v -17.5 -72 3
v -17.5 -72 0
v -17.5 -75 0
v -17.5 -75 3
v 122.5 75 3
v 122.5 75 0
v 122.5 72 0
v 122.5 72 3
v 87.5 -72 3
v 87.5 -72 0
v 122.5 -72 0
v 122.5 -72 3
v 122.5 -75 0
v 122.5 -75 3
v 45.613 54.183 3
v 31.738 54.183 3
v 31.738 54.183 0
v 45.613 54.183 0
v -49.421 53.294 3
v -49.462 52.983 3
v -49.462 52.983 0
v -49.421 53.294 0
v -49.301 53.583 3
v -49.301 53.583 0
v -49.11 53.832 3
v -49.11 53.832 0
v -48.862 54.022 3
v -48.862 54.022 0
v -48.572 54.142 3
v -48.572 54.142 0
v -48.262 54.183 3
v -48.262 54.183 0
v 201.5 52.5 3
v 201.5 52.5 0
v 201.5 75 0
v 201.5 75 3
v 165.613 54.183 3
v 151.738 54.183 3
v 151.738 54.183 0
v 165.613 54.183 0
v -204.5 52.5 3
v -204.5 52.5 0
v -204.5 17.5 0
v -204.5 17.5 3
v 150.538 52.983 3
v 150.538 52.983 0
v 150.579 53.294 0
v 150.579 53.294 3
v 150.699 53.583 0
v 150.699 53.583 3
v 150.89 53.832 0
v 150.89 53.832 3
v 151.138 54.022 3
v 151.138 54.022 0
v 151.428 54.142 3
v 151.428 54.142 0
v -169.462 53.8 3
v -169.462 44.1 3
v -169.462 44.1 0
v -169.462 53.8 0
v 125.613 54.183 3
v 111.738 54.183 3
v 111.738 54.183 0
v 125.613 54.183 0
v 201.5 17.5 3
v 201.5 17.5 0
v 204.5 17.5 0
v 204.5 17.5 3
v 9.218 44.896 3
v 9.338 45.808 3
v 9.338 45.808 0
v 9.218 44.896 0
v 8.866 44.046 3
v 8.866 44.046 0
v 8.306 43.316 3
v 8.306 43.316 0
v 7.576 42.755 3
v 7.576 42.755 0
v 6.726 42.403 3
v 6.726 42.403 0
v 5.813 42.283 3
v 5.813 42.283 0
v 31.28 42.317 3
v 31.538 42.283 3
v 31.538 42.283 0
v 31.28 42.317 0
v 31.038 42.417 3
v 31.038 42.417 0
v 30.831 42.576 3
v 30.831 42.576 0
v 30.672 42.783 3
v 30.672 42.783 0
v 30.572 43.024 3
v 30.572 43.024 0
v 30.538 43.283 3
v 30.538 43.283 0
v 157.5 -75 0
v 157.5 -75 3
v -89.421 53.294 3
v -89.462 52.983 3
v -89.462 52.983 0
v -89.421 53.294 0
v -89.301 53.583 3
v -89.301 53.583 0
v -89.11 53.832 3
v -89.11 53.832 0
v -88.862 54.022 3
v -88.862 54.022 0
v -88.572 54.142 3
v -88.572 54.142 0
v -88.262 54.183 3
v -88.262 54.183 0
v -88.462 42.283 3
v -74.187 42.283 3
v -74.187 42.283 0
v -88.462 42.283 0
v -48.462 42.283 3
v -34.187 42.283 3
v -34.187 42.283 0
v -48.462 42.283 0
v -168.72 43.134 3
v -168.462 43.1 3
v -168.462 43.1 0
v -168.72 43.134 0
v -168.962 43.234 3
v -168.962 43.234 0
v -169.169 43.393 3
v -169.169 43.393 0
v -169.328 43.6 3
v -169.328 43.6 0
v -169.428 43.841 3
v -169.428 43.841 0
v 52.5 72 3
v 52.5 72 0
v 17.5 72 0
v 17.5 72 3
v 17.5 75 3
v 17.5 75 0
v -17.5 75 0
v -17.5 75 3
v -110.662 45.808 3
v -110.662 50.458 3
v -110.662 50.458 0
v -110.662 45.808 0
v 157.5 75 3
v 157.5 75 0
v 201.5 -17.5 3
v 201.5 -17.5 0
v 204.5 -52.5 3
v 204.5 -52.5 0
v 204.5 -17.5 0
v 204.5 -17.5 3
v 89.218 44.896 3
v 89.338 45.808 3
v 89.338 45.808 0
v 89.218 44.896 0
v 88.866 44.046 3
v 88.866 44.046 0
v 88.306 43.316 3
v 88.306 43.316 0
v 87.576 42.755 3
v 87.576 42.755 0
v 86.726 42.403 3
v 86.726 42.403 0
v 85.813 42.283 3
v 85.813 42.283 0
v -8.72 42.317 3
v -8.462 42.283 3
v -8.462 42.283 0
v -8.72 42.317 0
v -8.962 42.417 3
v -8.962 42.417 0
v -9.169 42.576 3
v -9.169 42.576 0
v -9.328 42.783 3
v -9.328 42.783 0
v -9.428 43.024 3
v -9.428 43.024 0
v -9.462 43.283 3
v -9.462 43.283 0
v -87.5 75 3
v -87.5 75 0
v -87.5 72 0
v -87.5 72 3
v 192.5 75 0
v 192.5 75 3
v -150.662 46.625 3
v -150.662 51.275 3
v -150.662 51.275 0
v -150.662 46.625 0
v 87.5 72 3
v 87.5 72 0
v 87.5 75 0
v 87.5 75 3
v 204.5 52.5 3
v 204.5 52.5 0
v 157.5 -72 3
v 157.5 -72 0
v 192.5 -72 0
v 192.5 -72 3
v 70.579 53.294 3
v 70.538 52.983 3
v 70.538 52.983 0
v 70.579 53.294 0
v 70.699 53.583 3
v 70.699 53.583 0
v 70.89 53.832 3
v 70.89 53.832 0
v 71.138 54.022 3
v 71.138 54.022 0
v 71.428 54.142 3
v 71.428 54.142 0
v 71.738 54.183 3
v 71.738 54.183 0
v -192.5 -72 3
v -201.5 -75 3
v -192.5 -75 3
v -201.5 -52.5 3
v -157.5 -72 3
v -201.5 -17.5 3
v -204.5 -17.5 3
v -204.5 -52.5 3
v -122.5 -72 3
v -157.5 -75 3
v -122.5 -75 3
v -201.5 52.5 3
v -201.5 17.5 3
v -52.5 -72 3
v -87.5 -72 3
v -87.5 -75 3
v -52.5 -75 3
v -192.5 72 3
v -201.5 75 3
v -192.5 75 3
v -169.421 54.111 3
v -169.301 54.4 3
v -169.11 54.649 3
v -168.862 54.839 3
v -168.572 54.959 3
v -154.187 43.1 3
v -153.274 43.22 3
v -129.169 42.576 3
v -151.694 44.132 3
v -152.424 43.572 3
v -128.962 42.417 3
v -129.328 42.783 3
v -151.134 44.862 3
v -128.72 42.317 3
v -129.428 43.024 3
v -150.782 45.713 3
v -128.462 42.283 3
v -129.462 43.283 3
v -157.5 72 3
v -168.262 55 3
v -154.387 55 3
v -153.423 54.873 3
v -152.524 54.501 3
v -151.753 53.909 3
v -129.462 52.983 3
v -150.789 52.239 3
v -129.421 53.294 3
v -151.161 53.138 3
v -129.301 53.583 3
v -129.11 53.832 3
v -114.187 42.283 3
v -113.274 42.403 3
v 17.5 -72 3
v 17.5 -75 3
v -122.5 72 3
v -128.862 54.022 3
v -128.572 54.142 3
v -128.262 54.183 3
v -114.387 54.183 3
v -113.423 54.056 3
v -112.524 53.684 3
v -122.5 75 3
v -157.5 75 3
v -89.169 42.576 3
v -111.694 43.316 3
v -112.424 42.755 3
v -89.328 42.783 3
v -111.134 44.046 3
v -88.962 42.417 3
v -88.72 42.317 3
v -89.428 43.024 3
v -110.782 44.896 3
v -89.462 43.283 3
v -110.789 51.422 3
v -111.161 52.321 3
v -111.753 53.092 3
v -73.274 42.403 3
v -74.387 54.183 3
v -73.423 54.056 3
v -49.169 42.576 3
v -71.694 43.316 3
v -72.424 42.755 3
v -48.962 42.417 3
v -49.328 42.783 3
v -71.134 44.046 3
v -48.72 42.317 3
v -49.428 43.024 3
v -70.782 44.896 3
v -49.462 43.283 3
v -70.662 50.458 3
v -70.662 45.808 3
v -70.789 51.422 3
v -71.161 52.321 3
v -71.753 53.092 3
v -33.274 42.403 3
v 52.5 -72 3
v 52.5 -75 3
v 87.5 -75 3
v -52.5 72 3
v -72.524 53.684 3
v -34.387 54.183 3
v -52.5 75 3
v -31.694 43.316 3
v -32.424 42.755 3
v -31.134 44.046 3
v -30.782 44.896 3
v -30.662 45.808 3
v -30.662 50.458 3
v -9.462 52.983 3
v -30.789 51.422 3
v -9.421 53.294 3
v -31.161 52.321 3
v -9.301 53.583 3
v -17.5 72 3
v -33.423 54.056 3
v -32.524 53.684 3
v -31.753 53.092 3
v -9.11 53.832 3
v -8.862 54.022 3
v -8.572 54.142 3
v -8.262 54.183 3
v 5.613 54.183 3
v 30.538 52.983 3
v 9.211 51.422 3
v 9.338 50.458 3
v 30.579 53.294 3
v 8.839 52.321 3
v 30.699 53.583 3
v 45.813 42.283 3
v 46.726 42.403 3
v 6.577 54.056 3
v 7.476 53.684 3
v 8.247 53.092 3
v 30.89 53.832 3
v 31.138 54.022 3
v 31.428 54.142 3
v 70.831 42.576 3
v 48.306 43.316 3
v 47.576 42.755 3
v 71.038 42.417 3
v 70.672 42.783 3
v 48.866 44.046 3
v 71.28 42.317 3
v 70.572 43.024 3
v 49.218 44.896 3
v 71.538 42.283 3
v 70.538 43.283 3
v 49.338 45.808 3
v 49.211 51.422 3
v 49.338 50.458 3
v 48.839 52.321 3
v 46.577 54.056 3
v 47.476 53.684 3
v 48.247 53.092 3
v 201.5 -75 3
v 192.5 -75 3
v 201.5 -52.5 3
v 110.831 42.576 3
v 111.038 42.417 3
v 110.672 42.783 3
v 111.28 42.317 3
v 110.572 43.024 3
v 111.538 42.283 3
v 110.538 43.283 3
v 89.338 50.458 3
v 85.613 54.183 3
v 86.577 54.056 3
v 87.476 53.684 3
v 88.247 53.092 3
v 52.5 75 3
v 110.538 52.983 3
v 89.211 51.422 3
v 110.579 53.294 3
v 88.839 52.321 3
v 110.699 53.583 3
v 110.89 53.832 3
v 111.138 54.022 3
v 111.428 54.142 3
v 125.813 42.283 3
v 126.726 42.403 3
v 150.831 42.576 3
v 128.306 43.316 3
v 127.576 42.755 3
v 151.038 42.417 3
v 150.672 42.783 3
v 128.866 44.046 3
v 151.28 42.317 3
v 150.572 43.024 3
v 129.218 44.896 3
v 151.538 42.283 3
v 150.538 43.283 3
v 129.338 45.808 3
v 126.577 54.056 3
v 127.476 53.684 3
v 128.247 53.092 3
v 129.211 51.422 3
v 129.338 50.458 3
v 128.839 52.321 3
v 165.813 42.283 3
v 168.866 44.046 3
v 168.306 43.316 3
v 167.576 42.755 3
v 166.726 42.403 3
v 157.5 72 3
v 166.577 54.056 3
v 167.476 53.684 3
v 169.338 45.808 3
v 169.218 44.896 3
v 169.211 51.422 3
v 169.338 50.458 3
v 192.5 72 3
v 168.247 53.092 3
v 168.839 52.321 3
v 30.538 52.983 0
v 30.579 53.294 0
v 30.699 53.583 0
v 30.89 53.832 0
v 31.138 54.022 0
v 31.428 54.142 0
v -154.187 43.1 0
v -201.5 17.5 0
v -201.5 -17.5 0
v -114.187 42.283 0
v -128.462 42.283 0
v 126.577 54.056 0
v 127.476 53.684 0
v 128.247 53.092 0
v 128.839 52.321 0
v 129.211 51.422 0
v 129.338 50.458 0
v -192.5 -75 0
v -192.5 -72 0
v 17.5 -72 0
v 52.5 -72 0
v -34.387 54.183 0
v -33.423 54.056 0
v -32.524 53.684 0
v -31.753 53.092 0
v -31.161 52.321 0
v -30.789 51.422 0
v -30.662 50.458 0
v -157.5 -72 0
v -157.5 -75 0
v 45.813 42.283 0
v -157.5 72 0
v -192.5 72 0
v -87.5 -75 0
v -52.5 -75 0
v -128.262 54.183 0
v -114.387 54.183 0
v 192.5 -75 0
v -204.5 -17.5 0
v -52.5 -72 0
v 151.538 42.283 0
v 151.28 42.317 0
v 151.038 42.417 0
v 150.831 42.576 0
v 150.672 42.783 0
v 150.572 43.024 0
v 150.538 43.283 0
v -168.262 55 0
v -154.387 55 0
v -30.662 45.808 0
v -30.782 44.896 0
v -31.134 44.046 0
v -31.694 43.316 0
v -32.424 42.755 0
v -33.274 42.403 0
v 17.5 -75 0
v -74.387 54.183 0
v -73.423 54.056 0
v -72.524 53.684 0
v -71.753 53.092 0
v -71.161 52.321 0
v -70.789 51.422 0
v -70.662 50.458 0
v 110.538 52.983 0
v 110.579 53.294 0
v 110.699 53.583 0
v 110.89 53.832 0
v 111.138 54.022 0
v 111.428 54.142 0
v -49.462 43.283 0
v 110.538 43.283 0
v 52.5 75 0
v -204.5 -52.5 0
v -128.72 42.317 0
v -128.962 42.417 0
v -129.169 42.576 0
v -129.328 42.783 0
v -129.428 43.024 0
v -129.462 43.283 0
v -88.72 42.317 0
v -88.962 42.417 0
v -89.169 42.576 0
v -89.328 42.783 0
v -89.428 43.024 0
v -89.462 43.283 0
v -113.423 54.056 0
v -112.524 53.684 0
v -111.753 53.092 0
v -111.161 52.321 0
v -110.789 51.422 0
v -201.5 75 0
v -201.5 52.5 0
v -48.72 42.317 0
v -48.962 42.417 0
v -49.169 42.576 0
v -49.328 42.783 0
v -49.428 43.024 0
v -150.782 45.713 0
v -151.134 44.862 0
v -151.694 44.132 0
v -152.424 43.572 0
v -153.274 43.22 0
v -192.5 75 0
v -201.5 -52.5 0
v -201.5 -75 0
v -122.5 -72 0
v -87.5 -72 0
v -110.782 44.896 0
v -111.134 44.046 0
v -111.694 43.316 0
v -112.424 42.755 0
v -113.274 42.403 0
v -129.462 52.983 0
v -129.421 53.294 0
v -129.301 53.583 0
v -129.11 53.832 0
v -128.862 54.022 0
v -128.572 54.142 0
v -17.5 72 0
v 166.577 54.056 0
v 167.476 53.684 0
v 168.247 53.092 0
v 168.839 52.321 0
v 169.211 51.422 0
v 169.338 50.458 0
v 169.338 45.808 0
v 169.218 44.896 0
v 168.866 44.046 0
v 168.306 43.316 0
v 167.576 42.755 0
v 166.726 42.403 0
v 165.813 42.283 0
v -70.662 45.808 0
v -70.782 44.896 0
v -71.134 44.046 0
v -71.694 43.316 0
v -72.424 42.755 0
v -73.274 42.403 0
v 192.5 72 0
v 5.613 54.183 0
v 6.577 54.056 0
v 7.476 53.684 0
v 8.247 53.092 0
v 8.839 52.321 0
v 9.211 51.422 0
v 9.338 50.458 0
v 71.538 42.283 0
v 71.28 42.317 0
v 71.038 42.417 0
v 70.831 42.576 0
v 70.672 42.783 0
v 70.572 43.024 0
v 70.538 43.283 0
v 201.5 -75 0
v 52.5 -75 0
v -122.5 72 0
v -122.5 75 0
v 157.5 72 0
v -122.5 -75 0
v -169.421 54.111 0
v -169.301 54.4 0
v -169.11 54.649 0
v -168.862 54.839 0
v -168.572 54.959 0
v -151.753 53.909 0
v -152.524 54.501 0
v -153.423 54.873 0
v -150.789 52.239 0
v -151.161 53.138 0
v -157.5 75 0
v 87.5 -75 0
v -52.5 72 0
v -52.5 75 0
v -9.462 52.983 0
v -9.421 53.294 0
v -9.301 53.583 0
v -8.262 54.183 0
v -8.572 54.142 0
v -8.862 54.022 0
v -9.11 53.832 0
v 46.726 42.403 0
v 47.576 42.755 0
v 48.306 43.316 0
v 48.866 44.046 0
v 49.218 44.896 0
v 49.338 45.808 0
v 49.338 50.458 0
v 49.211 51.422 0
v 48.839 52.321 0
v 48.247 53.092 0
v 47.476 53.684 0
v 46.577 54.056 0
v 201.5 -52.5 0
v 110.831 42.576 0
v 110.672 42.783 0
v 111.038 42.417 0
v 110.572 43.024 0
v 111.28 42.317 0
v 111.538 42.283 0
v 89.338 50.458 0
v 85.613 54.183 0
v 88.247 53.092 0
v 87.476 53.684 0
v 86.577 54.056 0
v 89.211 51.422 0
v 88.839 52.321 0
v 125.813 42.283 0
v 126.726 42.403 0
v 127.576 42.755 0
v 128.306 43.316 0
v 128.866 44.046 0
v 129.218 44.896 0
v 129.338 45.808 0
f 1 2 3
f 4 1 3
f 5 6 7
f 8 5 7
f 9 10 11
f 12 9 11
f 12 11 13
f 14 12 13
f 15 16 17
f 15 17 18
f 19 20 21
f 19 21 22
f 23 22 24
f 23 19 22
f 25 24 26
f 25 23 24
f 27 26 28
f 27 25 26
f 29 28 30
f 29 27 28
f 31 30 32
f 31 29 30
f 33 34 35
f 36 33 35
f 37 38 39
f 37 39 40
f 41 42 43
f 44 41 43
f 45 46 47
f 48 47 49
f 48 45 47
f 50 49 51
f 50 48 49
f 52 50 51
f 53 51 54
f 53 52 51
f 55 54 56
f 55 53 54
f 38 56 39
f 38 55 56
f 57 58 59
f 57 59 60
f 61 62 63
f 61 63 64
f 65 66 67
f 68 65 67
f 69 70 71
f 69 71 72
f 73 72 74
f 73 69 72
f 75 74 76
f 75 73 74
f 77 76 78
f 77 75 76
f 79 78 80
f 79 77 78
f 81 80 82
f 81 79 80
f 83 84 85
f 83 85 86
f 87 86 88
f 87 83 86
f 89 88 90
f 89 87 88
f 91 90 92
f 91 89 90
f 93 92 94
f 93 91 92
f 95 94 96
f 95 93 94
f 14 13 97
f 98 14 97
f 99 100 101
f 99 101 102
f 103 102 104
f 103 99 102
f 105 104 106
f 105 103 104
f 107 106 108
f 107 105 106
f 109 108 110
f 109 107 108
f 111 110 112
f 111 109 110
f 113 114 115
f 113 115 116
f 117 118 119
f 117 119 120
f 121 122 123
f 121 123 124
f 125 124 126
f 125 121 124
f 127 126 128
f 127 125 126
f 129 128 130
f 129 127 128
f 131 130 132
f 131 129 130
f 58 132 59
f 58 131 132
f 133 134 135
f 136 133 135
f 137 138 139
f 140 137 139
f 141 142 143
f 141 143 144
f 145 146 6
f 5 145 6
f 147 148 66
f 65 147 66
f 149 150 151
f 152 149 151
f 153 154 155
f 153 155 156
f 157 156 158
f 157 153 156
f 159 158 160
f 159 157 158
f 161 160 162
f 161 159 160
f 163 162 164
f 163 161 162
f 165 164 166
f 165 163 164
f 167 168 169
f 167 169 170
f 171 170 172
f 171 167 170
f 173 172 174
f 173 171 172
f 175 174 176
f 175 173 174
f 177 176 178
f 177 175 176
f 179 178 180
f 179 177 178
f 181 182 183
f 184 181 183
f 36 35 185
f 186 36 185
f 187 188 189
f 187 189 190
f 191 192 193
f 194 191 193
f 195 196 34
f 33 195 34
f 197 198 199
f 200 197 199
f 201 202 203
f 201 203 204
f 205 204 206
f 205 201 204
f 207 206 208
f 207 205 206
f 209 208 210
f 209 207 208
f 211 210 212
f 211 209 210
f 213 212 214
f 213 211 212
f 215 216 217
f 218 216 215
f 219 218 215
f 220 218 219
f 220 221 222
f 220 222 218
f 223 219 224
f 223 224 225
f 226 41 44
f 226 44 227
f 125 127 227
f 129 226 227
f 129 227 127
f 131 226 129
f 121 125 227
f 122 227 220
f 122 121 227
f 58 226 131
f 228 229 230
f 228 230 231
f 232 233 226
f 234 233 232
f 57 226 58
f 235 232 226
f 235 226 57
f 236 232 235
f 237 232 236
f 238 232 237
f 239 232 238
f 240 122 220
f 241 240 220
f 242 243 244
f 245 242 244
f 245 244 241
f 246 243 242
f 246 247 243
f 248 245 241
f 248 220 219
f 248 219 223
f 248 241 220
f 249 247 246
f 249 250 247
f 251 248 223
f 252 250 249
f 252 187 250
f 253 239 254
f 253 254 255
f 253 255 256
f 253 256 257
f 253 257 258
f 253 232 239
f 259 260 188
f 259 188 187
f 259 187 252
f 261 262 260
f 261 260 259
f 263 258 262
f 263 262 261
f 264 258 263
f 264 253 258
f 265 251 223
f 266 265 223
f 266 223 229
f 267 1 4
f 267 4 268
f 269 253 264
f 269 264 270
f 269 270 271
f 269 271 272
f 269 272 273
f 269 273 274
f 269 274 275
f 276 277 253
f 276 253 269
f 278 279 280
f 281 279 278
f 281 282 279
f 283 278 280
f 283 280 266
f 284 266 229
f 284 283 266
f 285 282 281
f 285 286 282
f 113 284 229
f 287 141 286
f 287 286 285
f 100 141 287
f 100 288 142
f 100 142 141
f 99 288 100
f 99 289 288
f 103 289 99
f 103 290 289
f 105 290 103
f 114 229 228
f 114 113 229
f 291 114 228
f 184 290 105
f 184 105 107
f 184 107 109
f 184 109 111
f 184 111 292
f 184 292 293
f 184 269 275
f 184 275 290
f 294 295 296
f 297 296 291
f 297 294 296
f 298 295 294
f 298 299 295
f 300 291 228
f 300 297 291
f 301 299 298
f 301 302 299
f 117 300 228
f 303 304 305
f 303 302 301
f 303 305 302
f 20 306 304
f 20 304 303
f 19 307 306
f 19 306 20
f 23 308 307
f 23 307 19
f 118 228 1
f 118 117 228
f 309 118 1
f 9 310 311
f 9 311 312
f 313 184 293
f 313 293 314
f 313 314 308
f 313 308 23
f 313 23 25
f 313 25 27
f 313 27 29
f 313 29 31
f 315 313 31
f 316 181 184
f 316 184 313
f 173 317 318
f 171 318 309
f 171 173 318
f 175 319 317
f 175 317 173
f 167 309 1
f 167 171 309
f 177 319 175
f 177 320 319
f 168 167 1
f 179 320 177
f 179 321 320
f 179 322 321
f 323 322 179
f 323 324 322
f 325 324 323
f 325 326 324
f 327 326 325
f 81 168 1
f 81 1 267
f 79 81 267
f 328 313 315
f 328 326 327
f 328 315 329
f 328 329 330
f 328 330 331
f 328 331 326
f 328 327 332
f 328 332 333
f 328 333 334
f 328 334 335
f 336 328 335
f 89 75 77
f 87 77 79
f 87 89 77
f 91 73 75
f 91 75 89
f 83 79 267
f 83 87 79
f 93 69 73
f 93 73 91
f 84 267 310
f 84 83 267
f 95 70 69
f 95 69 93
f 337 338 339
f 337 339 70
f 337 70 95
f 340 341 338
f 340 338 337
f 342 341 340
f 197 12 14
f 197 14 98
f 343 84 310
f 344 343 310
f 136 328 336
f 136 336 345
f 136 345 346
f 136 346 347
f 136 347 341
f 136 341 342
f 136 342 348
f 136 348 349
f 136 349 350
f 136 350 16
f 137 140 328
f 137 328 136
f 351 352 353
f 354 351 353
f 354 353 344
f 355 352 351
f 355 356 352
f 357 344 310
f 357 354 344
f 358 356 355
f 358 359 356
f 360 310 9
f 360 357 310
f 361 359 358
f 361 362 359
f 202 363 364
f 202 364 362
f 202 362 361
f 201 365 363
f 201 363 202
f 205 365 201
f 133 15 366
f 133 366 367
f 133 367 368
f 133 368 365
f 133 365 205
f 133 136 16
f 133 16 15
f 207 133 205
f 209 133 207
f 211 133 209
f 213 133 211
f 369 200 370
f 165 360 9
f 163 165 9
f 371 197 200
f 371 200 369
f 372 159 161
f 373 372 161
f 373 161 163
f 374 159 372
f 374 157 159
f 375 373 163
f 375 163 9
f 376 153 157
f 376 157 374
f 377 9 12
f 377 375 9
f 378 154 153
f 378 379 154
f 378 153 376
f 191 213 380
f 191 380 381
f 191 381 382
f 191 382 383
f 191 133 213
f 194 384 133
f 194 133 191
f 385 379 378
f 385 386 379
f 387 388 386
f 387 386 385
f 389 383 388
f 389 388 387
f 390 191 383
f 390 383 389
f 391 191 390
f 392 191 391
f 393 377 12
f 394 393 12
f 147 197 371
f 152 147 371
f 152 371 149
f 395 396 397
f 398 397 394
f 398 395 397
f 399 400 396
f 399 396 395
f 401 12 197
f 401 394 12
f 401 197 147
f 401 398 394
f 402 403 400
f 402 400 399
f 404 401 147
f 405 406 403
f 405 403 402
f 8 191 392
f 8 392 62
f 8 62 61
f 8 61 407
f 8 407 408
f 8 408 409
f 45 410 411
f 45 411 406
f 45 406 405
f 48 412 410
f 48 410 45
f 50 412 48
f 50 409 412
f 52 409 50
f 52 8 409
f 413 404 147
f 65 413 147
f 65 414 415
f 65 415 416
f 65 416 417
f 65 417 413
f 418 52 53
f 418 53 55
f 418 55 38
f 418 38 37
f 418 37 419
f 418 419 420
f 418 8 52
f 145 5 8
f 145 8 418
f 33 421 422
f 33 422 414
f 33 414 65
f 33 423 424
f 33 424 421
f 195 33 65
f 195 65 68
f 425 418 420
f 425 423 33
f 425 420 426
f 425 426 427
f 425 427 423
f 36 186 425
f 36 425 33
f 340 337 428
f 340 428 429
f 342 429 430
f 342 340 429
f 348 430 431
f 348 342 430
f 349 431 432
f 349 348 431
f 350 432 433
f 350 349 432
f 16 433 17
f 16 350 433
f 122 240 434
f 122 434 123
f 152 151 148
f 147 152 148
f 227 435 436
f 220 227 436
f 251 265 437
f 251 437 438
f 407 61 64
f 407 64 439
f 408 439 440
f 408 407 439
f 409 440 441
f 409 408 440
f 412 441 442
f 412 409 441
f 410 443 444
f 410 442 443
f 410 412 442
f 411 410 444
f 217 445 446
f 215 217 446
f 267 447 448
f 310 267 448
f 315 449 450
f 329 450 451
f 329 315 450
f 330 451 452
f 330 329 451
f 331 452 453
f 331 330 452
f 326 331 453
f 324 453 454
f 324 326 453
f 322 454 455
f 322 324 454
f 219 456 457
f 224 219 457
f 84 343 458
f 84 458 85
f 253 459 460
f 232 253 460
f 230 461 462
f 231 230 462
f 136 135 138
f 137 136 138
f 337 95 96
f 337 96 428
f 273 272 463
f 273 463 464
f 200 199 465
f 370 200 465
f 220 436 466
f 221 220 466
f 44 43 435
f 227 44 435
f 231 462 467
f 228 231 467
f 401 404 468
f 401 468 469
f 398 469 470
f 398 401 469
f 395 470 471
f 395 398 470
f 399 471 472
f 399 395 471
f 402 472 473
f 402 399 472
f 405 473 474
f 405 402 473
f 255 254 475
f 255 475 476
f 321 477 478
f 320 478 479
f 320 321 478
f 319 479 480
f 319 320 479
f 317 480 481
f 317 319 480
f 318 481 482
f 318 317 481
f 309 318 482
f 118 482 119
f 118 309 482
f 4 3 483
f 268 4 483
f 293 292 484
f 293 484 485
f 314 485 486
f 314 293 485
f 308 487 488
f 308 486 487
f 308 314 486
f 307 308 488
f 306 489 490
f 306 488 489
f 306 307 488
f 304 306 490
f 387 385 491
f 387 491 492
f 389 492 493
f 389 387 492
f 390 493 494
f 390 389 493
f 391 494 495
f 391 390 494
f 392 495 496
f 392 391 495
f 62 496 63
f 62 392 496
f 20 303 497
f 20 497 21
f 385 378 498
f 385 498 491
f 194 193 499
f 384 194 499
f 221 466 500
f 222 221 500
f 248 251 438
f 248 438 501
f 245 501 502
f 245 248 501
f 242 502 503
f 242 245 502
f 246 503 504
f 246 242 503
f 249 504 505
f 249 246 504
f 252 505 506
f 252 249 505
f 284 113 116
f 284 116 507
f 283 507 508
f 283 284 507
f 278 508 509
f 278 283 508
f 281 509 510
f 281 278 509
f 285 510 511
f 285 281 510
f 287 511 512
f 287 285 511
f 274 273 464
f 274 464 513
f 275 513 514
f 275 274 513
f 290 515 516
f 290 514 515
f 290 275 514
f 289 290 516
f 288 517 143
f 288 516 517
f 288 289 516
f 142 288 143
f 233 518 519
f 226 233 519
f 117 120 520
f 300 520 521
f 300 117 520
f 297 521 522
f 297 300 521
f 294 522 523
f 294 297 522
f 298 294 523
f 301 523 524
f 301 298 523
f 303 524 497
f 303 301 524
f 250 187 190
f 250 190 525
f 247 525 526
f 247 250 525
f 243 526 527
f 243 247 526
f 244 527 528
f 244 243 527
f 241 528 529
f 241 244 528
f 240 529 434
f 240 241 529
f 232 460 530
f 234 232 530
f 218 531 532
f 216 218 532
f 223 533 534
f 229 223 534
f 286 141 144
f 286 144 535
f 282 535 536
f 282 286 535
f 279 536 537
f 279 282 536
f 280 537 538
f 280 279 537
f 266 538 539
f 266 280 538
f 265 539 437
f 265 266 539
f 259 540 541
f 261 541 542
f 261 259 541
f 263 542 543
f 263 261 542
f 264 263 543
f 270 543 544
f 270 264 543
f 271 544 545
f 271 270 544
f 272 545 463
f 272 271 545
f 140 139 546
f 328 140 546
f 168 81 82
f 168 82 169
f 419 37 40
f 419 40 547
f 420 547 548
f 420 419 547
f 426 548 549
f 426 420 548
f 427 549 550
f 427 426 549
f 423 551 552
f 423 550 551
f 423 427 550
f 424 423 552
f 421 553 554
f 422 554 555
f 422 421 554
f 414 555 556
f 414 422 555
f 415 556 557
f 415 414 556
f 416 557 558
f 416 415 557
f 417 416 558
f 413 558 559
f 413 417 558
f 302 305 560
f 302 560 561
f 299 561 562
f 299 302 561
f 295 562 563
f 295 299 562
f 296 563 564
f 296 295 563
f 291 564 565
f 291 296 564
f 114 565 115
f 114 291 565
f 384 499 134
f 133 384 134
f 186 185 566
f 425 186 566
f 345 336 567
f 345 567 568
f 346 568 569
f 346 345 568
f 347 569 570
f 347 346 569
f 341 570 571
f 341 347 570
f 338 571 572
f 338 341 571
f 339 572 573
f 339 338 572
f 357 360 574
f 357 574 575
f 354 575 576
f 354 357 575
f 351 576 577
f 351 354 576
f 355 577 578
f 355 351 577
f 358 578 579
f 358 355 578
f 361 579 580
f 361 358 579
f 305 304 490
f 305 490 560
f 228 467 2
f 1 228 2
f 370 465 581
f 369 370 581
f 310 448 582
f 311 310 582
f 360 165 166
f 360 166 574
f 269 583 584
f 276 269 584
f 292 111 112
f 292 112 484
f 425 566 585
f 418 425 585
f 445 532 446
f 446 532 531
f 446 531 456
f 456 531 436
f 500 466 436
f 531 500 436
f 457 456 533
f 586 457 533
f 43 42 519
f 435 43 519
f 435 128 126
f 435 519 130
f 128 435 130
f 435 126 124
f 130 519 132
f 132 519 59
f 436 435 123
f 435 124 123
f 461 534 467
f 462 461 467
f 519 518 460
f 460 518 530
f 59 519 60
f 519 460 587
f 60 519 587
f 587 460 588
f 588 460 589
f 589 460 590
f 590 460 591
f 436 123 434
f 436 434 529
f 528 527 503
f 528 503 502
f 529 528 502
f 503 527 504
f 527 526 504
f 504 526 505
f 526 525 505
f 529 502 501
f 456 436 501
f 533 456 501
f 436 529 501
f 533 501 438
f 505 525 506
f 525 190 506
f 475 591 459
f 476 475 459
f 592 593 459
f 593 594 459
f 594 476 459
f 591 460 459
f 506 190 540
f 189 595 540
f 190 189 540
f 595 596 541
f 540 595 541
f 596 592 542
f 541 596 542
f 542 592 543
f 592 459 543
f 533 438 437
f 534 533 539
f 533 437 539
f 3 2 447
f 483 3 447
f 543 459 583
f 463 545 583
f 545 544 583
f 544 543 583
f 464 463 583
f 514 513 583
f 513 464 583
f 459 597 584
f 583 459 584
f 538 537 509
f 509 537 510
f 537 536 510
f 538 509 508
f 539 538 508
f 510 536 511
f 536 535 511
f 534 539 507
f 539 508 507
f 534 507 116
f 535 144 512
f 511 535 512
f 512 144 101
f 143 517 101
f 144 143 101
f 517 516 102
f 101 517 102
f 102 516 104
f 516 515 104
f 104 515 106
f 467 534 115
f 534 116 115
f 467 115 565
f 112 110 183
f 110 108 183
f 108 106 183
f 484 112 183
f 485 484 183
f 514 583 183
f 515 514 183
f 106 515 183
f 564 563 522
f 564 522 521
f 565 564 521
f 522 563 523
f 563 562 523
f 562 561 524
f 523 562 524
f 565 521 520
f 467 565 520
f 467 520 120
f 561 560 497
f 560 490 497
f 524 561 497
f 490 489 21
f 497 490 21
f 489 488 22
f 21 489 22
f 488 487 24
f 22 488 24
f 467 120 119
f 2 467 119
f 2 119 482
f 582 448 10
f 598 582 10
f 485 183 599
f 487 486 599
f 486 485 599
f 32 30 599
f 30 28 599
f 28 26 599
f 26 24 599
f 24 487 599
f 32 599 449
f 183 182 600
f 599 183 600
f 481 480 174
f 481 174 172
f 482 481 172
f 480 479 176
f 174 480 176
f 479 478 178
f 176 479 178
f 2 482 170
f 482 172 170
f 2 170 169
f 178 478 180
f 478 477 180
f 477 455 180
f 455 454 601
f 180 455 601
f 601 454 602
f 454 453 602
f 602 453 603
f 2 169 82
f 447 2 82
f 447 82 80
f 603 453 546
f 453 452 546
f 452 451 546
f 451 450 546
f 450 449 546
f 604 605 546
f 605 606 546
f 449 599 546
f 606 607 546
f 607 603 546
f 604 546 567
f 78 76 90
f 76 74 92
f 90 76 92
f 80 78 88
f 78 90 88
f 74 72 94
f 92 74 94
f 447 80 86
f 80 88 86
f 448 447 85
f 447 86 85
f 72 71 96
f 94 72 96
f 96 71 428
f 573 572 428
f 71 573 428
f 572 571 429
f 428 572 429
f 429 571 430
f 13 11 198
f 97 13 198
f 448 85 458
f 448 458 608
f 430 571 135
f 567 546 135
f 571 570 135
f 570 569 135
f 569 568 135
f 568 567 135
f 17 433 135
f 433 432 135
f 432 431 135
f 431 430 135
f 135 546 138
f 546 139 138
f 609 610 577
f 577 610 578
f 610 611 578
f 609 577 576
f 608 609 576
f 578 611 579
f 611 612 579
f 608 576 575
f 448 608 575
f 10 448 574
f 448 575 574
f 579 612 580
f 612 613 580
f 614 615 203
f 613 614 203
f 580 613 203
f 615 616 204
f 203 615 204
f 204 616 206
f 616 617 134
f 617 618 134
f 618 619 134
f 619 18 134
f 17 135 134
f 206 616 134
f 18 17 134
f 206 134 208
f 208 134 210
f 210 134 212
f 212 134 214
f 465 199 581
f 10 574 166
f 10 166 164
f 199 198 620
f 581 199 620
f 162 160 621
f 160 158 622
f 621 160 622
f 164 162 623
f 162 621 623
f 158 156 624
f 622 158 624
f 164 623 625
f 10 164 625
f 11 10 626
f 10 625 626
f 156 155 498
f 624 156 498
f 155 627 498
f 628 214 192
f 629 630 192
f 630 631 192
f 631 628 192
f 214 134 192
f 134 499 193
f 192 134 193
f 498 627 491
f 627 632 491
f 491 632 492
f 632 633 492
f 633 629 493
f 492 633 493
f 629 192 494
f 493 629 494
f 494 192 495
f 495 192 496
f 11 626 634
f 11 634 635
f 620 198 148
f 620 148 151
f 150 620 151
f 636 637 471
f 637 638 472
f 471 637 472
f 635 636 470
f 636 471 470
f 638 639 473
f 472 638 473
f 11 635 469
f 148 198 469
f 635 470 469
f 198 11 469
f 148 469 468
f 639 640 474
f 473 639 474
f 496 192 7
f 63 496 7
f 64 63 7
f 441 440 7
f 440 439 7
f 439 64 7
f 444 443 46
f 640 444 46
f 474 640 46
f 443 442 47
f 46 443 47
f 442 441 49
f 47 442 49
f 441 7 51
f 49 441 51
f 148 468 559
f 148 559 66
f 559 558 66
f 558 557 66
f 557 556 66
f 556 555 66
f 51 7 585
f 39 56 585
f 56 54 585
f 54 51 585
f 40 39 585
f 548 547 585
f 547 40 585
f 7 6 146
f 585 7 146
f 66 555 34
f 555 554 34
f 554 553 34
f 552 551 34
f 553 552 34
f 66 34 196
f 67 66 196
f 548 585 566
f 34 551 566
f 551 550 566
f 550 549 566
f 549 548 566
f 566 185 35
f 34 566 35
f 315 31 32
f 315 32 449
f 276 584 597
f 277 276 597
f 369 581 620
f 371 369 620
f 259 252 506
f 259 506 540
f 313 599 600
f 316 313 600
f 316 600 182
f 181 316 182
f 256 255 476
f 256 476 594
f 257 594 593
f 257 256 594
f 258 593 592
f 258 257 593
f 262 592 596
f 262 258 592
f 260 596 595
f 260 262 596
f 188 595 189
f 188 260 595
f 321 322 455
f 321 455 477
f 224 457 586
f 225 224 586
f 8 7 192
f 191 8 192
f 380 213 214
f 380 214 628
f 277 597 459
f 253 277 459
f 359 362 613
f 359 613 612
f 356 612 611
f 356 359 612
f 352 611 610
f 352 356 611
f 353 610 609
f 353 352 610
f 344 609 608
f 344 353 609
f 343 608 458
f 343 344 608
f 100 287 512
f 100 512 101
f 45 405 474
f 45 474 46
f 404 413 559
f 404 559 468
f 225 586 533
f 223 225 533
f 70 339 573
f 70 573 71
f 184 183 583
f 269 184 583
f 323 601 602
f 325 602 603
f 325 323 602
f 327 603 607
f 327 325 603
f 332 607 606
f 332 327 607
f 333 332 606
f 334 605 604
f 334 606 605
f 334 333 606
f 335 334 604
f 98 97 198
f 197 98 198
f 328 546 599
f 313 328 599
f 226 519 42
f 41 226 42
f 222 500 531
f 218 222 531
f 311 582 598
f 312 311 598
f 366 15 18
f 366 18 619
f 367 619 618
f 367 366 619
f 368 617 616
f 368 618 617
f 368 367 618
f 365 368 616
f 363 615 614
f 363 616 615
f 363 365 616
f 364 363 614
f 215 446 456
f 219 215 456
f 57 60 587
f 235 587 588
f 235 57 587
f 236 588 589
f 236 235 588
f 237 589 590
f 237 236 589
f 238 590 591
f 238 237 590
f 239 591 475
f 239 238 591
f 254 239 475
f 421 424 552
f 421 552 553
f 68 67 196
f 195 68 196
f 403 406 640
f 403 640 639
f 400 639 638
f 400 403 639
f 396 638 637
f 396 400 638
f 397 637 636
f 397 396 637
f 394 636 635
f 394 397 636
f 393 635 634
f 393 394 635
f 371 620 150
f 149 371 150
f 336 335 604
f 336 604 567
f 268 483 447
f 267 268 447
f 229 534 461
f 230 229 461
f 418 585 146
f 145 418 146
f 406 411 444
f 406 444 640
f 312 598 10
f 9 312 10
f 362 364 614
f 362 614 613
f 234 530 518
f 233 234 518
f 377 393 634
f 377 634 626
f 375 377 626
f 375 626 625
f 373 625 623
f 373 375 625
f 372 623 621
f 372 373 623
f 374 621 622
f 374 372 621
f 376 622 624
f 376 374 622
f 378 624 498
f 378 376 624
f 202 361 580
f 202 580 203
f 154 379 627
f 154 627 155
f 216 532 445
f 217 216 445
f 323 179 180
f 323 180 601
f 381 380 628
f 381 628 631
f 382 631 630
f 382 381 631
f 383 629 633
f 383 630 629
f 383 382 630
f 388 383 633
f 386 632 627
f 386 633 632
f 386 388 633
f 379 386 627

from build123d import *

# Parameters (mm, degrees)
BOSS_EXTRUDE1_DEPTH = 3
CUT_EXTRUDE1_DEPTH  = 218.839964194


with BuildPart() as part:
    # Model → Boss-Extrude1 (new body)
    with BuildSketch(Plane.XY):
        Polygon((201.5, 75), (192.5, 75), (192.5, 72), (157.5, 72), (157.5, 75), (122.5, 75), (122.5, 72), (87.5, 72), (87.5, 75), (52.5, 75), (52.5, 72), (17.5, 72), (17.5, 75), (-17.5, 75), (-17.5, 72), (-52.5, 72), (-52.5, 75), (-87.5, 75), (-87.5, 72), (-122.5, 72), (-122.5, 75), (-157.5, 75), (-157.5, 72), (-192.5, 72), (-192.5, 75), (-201.5, 75), (-201.5, 72), (-201.5, 52.5), (-204.5, 52.5), (-204.5, 17.5), (-201.5, 17.5), (-201.5, -17.5), (-204.5, -17.5), (-204.5, -52.5), (-201.5, -52.5), (-201.5, -72), (-201.5, -75), (-192.5, -75), (-192.5, -72), (-157.5, -72), (-157.5, -75), (-122.5, -75), (-122.5, -72), (-87.5, -72), (-87.5, -75), (-52.5, -75), (-52.5, -72), (-17.5, -72), (-17.5, -75), (17.5, -75), (17.5, -72), (52.5, -72), (52.5, -75), (87.5, -75), (87.5, -72), (122.5, -72), (122.5, -75), (157.5, -75), (157.5, -72), (192.5, -72), (192.5, -75), (201.5, -75), (201.5, -72), (201.5, -52.5), (204.5, -52.5), (204.5, -17.5), (201.5, -17.5), (201.5, 17.5), (204.5, 17.5), (204.5, 52.5), (201.5, 52.5), (201.5, 72), align=None)
    extrude(amount=BOSS_EXTRUDE1_DEPTH)

    # Sketch1 → Cut-Extrude1 (cut, through all)
    with BuildSketch(Plane.XY.offset(3)):
        with BuildLine():
            Line((-154.186662726, 43.1), (-168.461662726, 43.1))
            ThreePointArc((-168.461662726, 43.1), (-169.168769507, 43.392893219), (-169.461662726, 44.1))
            Line((-169.461662726, 44.1), (-169.461662726, 53.8))
            ThreePointArc((-169.461662726, 53.8), (-169.110190863, 54.648528137), (-168.261662726, 55))
            Line((-168.261662726, 55), (-154.386662726, 55))
            ThreePointArc((-154.386662726, 55), (-151.752689966, 53.90897276), (-150.661662726, 51.275))
            Line((-150.661662726, 51.275), (-150.661662726, 46.625))
            ThreePointArc((-150.661662726, 46.625), (-151.694111322, 44.132448596), (-154.186662726, 43.1))
        make_face()
        with BuildLine():
            Line((-114.186662726, 42.283204501), (-128.461662726, 42.283204501))
            ThreePointArc((-128.461662726, 42.283204501), (-129.168769507, 42.57609772), (-129.461662726, 43.283204501))
            Line((-129.461662726, 43.283204501), (-129.461662726, 52.983204501))
            ThreePointArc((-129.461662726, 52.983204501), (-129.110190863, 53.831732638), (-128.261662726, 54.183204501))
            Line((-128.261662726, 54.183204501), (-114.386662726, 54.183204501))
            ThreePointArc((-114.386662726, 54.183204501), (-111.752689966, 53.092177261), (-110.661662726, 50.458204501))
            Line((-110.661662726, 50.458204501), (-110.661662726, 45.808204501))
            ThreePointArc((-110.661662726, 45.808204501), (-111.694111322, 43.315653097), (-114.186662726, 42.283204501))
        make_face()
        with BuildLine():
            Line((-74.186662726, 42.283204501), (-88.461662726, 42.283204501))
            ThreePointArc((-88.461662726, 42.283204501), (-89.168769507, 42.57609772), (-89.461662726, 43.283204501))
            Line((-89.461662726, 43.283204501), (-89.461662726, 52.983204501))
            ThreePointArc((-89.461662726, 52.983204501), (-89.110190863, 53.831732638), (-88.261662726, 54.183204501))
            Line((-88.261662726, 54.183204501), (-74.386662726, 54.183204501))
            ThreePointArc((-74.386662726, 54.183204501), (-71.752689966, 53.092177261), (-70.661662726, 50.458204501))
            Line((-70.661662726, 50.458204501), (-70.661662726, 45.808204501))
            ThreePointArc((-70.661662726, 45.808204501), (-71.694111322, 43.315653097), (-74.186662726, 42.283204501))
        make_face()
        with BuildLine():
            Line((-34.186662726, 42.283204501), (-48.461662726, 42.283204501))
            ThreePointArc((-48.461662726, 42.283204501), (-49.168769507, 42.57609772), (-49.461662726, 43.283204501))
            Line((-49.461662726, 43.283204501), (-49.461662726, 52.983204501))
            ThreePointArc((-49.461662726, 52.983204501), (-49.110190863, 53.831732638), (-48.261662726, 54.183204501))
            Line((-48.261662726, 54.183204501), (-34.386662726, 54.183204501))
            ThreePointArc((-34.386662726, 54.183204501), (-31.752689966, 53.092177261), (-30.661662726, 50.458204501))
            Line((-30.661662726, 50.458204501), (-30.661662726, 45.808204501))
            ThreePointArc((-30.661662726, 45.808204501), (-31.694111322, 43.315653097), (-34.186662726, 42.283204501))
        make_face()
        with BuildLine():
            Line((5.813337274, 42.283204501), (-8.461662726, 42.283204501))
            ThreePointArc((-8.461662726, 42.283204501), (-9.168769507, 42.57609772), (-9.461662726, 43.283204501))
            Line((-9.461662726, 43.283204501), (-9.461662726, 52.983204501))
            ThreePointArc((-9.461662726, 52.983204501), (-9.110190863, 53.831732638), (-8.261662726, 54.183204501))
            Line((-8.261662726, 54.183204501), (5.613337274, 54.183204501))
            ThreePointArc((5.613337274, 54.183204501), (8.247310034, 53.092177261), (9.338337274, 50.458204501))
            Line((9.338337274, 50.458204501), (9.338337274, 45.808204501))
            ThreePointArc((9.338337274, 45.808204501), (8.305888678, 43.315653097), (5.813337274, 42.283204501))
        make_face()
        with BuildLine():
            Line((45.813337274, 42.283204501), (31.538337274, 42.283204501))
            ThreePointArc((31.538337274, 42.283204501), (30.831230493, 42.57609772), (30.538337274, 43.283204501))
            Line((30.538337274, 43.283204501), (30.538337274, 52.983204501))
            ThreePointArc((30.538337274, 52.983204501), (30.889809137, 53.831732638), (31.738337274, 54.183204501))
            Line((31.738337274, 54.183204501), (45.613337274, 54.183204501))
            ThreePointArc((45.613337274, 54.183204501), (48.247310034, 53.092177261), (49.338337274, 50.458204501))
            Line((49.338337274, 50.458204501), (49.338337274, 45.808204501))
            ThreePointArc((49.338337274, 45.808204501), (48.305888678, 43.315653097), (45.813337274, 42.283204501))
        make_face()
        with BuildLine():
            Line((85.813337274, 42.283204501), (71.538337274, 42.283204501))
            ThreePointArc((71.538337274, 42.283204501), (70.831230493, 42.57609772), (70.538337274, 43.283204501))
            Line((70.538337274, 43.283204501), (70.538337274, 52.983204501))
            ThreePointArc((70.538337274, 52.983204501), (70.889809137, 53.831732638), (71.738337274, 54.183204501))
            Line((71.738337274, 54.183204501), (85.613337274, 54.183204501))
            ThreePointArc((85.613337274, 54.183204501), (88.247310034, 53.092177261), (89.338337274, 50.458204501))
            Line((89.338337274, 50.458204501), (89.338337274, 45.808204501))
            ThreePointArc((89.338337274, 45.808204501), (88.305888678, 43.315653097), (85.813337274, 42.283204501))
        make_face()
        with BuildLine():
            Line((125.813337274, 42.283204501), (111.538337274, 42.283204501))
            ThreePointArc((111.538337274, 42.283204501), (110.831230493, 42.57609772), (110.538337274, 43.283204501))
            Line((110.538337274, 43.283204501), (110.538337274, 52.983204501))
            ThreePointArc((110.538337274, 52.983204501), (110.889809137, 53.831732638), (111.738337274, 54.183204501))
            Line((111.738337274, 54.183204501), (125.613337274, 54.183204501))
            ThreePointArc((125.613337274, 54.183204501), (128.247310034, 53.092177261), (129.338337274, 50.458204501))
            Line((129.338337274, 50.458204501), (129.338337274, 45.808204501))
            ThreePointArc((129.338337274, 45.808204501), (128.305888678, 43.315653097), (125.813337274, 42.283204501))
        make_face()
        with BuildLine():
            Line((165.813337274, 42.283204501), (151.538337274, 42.283204501))
            ThreePointArc((151.538337274, 42.283204501), (150.831230493, 42.57609772), (150.538337274, 43.283204501))
            Line((150.538337274, 43.283204501), (150.538337274, 52.983204501))
            ThreePointArc((150.538337274, 52.983204501), (150.889809137, 53.831732638), (151.738337274, 54.183204501))
            Line((151.738337274, 54.183204501), (165.613337274, 54.183204501))
            ThreePointArc((165.613337274, 54.183204501), (168.247310034, 53.092177261), (169.338337274, 50.458204501))
            Line((169.338337274, 50.458204501), (169.338337274, 45.808204501))
            ThreePointArc((169.338337274, 45.808204501), (168.305888678, 43.315653097), (165.813337274, 42.283204501))
        make_face()
    extrude(amount=-CUT_EXTRUDE1_DEPTH, mode=Mode.SUBTRACT)


solid = part.part
